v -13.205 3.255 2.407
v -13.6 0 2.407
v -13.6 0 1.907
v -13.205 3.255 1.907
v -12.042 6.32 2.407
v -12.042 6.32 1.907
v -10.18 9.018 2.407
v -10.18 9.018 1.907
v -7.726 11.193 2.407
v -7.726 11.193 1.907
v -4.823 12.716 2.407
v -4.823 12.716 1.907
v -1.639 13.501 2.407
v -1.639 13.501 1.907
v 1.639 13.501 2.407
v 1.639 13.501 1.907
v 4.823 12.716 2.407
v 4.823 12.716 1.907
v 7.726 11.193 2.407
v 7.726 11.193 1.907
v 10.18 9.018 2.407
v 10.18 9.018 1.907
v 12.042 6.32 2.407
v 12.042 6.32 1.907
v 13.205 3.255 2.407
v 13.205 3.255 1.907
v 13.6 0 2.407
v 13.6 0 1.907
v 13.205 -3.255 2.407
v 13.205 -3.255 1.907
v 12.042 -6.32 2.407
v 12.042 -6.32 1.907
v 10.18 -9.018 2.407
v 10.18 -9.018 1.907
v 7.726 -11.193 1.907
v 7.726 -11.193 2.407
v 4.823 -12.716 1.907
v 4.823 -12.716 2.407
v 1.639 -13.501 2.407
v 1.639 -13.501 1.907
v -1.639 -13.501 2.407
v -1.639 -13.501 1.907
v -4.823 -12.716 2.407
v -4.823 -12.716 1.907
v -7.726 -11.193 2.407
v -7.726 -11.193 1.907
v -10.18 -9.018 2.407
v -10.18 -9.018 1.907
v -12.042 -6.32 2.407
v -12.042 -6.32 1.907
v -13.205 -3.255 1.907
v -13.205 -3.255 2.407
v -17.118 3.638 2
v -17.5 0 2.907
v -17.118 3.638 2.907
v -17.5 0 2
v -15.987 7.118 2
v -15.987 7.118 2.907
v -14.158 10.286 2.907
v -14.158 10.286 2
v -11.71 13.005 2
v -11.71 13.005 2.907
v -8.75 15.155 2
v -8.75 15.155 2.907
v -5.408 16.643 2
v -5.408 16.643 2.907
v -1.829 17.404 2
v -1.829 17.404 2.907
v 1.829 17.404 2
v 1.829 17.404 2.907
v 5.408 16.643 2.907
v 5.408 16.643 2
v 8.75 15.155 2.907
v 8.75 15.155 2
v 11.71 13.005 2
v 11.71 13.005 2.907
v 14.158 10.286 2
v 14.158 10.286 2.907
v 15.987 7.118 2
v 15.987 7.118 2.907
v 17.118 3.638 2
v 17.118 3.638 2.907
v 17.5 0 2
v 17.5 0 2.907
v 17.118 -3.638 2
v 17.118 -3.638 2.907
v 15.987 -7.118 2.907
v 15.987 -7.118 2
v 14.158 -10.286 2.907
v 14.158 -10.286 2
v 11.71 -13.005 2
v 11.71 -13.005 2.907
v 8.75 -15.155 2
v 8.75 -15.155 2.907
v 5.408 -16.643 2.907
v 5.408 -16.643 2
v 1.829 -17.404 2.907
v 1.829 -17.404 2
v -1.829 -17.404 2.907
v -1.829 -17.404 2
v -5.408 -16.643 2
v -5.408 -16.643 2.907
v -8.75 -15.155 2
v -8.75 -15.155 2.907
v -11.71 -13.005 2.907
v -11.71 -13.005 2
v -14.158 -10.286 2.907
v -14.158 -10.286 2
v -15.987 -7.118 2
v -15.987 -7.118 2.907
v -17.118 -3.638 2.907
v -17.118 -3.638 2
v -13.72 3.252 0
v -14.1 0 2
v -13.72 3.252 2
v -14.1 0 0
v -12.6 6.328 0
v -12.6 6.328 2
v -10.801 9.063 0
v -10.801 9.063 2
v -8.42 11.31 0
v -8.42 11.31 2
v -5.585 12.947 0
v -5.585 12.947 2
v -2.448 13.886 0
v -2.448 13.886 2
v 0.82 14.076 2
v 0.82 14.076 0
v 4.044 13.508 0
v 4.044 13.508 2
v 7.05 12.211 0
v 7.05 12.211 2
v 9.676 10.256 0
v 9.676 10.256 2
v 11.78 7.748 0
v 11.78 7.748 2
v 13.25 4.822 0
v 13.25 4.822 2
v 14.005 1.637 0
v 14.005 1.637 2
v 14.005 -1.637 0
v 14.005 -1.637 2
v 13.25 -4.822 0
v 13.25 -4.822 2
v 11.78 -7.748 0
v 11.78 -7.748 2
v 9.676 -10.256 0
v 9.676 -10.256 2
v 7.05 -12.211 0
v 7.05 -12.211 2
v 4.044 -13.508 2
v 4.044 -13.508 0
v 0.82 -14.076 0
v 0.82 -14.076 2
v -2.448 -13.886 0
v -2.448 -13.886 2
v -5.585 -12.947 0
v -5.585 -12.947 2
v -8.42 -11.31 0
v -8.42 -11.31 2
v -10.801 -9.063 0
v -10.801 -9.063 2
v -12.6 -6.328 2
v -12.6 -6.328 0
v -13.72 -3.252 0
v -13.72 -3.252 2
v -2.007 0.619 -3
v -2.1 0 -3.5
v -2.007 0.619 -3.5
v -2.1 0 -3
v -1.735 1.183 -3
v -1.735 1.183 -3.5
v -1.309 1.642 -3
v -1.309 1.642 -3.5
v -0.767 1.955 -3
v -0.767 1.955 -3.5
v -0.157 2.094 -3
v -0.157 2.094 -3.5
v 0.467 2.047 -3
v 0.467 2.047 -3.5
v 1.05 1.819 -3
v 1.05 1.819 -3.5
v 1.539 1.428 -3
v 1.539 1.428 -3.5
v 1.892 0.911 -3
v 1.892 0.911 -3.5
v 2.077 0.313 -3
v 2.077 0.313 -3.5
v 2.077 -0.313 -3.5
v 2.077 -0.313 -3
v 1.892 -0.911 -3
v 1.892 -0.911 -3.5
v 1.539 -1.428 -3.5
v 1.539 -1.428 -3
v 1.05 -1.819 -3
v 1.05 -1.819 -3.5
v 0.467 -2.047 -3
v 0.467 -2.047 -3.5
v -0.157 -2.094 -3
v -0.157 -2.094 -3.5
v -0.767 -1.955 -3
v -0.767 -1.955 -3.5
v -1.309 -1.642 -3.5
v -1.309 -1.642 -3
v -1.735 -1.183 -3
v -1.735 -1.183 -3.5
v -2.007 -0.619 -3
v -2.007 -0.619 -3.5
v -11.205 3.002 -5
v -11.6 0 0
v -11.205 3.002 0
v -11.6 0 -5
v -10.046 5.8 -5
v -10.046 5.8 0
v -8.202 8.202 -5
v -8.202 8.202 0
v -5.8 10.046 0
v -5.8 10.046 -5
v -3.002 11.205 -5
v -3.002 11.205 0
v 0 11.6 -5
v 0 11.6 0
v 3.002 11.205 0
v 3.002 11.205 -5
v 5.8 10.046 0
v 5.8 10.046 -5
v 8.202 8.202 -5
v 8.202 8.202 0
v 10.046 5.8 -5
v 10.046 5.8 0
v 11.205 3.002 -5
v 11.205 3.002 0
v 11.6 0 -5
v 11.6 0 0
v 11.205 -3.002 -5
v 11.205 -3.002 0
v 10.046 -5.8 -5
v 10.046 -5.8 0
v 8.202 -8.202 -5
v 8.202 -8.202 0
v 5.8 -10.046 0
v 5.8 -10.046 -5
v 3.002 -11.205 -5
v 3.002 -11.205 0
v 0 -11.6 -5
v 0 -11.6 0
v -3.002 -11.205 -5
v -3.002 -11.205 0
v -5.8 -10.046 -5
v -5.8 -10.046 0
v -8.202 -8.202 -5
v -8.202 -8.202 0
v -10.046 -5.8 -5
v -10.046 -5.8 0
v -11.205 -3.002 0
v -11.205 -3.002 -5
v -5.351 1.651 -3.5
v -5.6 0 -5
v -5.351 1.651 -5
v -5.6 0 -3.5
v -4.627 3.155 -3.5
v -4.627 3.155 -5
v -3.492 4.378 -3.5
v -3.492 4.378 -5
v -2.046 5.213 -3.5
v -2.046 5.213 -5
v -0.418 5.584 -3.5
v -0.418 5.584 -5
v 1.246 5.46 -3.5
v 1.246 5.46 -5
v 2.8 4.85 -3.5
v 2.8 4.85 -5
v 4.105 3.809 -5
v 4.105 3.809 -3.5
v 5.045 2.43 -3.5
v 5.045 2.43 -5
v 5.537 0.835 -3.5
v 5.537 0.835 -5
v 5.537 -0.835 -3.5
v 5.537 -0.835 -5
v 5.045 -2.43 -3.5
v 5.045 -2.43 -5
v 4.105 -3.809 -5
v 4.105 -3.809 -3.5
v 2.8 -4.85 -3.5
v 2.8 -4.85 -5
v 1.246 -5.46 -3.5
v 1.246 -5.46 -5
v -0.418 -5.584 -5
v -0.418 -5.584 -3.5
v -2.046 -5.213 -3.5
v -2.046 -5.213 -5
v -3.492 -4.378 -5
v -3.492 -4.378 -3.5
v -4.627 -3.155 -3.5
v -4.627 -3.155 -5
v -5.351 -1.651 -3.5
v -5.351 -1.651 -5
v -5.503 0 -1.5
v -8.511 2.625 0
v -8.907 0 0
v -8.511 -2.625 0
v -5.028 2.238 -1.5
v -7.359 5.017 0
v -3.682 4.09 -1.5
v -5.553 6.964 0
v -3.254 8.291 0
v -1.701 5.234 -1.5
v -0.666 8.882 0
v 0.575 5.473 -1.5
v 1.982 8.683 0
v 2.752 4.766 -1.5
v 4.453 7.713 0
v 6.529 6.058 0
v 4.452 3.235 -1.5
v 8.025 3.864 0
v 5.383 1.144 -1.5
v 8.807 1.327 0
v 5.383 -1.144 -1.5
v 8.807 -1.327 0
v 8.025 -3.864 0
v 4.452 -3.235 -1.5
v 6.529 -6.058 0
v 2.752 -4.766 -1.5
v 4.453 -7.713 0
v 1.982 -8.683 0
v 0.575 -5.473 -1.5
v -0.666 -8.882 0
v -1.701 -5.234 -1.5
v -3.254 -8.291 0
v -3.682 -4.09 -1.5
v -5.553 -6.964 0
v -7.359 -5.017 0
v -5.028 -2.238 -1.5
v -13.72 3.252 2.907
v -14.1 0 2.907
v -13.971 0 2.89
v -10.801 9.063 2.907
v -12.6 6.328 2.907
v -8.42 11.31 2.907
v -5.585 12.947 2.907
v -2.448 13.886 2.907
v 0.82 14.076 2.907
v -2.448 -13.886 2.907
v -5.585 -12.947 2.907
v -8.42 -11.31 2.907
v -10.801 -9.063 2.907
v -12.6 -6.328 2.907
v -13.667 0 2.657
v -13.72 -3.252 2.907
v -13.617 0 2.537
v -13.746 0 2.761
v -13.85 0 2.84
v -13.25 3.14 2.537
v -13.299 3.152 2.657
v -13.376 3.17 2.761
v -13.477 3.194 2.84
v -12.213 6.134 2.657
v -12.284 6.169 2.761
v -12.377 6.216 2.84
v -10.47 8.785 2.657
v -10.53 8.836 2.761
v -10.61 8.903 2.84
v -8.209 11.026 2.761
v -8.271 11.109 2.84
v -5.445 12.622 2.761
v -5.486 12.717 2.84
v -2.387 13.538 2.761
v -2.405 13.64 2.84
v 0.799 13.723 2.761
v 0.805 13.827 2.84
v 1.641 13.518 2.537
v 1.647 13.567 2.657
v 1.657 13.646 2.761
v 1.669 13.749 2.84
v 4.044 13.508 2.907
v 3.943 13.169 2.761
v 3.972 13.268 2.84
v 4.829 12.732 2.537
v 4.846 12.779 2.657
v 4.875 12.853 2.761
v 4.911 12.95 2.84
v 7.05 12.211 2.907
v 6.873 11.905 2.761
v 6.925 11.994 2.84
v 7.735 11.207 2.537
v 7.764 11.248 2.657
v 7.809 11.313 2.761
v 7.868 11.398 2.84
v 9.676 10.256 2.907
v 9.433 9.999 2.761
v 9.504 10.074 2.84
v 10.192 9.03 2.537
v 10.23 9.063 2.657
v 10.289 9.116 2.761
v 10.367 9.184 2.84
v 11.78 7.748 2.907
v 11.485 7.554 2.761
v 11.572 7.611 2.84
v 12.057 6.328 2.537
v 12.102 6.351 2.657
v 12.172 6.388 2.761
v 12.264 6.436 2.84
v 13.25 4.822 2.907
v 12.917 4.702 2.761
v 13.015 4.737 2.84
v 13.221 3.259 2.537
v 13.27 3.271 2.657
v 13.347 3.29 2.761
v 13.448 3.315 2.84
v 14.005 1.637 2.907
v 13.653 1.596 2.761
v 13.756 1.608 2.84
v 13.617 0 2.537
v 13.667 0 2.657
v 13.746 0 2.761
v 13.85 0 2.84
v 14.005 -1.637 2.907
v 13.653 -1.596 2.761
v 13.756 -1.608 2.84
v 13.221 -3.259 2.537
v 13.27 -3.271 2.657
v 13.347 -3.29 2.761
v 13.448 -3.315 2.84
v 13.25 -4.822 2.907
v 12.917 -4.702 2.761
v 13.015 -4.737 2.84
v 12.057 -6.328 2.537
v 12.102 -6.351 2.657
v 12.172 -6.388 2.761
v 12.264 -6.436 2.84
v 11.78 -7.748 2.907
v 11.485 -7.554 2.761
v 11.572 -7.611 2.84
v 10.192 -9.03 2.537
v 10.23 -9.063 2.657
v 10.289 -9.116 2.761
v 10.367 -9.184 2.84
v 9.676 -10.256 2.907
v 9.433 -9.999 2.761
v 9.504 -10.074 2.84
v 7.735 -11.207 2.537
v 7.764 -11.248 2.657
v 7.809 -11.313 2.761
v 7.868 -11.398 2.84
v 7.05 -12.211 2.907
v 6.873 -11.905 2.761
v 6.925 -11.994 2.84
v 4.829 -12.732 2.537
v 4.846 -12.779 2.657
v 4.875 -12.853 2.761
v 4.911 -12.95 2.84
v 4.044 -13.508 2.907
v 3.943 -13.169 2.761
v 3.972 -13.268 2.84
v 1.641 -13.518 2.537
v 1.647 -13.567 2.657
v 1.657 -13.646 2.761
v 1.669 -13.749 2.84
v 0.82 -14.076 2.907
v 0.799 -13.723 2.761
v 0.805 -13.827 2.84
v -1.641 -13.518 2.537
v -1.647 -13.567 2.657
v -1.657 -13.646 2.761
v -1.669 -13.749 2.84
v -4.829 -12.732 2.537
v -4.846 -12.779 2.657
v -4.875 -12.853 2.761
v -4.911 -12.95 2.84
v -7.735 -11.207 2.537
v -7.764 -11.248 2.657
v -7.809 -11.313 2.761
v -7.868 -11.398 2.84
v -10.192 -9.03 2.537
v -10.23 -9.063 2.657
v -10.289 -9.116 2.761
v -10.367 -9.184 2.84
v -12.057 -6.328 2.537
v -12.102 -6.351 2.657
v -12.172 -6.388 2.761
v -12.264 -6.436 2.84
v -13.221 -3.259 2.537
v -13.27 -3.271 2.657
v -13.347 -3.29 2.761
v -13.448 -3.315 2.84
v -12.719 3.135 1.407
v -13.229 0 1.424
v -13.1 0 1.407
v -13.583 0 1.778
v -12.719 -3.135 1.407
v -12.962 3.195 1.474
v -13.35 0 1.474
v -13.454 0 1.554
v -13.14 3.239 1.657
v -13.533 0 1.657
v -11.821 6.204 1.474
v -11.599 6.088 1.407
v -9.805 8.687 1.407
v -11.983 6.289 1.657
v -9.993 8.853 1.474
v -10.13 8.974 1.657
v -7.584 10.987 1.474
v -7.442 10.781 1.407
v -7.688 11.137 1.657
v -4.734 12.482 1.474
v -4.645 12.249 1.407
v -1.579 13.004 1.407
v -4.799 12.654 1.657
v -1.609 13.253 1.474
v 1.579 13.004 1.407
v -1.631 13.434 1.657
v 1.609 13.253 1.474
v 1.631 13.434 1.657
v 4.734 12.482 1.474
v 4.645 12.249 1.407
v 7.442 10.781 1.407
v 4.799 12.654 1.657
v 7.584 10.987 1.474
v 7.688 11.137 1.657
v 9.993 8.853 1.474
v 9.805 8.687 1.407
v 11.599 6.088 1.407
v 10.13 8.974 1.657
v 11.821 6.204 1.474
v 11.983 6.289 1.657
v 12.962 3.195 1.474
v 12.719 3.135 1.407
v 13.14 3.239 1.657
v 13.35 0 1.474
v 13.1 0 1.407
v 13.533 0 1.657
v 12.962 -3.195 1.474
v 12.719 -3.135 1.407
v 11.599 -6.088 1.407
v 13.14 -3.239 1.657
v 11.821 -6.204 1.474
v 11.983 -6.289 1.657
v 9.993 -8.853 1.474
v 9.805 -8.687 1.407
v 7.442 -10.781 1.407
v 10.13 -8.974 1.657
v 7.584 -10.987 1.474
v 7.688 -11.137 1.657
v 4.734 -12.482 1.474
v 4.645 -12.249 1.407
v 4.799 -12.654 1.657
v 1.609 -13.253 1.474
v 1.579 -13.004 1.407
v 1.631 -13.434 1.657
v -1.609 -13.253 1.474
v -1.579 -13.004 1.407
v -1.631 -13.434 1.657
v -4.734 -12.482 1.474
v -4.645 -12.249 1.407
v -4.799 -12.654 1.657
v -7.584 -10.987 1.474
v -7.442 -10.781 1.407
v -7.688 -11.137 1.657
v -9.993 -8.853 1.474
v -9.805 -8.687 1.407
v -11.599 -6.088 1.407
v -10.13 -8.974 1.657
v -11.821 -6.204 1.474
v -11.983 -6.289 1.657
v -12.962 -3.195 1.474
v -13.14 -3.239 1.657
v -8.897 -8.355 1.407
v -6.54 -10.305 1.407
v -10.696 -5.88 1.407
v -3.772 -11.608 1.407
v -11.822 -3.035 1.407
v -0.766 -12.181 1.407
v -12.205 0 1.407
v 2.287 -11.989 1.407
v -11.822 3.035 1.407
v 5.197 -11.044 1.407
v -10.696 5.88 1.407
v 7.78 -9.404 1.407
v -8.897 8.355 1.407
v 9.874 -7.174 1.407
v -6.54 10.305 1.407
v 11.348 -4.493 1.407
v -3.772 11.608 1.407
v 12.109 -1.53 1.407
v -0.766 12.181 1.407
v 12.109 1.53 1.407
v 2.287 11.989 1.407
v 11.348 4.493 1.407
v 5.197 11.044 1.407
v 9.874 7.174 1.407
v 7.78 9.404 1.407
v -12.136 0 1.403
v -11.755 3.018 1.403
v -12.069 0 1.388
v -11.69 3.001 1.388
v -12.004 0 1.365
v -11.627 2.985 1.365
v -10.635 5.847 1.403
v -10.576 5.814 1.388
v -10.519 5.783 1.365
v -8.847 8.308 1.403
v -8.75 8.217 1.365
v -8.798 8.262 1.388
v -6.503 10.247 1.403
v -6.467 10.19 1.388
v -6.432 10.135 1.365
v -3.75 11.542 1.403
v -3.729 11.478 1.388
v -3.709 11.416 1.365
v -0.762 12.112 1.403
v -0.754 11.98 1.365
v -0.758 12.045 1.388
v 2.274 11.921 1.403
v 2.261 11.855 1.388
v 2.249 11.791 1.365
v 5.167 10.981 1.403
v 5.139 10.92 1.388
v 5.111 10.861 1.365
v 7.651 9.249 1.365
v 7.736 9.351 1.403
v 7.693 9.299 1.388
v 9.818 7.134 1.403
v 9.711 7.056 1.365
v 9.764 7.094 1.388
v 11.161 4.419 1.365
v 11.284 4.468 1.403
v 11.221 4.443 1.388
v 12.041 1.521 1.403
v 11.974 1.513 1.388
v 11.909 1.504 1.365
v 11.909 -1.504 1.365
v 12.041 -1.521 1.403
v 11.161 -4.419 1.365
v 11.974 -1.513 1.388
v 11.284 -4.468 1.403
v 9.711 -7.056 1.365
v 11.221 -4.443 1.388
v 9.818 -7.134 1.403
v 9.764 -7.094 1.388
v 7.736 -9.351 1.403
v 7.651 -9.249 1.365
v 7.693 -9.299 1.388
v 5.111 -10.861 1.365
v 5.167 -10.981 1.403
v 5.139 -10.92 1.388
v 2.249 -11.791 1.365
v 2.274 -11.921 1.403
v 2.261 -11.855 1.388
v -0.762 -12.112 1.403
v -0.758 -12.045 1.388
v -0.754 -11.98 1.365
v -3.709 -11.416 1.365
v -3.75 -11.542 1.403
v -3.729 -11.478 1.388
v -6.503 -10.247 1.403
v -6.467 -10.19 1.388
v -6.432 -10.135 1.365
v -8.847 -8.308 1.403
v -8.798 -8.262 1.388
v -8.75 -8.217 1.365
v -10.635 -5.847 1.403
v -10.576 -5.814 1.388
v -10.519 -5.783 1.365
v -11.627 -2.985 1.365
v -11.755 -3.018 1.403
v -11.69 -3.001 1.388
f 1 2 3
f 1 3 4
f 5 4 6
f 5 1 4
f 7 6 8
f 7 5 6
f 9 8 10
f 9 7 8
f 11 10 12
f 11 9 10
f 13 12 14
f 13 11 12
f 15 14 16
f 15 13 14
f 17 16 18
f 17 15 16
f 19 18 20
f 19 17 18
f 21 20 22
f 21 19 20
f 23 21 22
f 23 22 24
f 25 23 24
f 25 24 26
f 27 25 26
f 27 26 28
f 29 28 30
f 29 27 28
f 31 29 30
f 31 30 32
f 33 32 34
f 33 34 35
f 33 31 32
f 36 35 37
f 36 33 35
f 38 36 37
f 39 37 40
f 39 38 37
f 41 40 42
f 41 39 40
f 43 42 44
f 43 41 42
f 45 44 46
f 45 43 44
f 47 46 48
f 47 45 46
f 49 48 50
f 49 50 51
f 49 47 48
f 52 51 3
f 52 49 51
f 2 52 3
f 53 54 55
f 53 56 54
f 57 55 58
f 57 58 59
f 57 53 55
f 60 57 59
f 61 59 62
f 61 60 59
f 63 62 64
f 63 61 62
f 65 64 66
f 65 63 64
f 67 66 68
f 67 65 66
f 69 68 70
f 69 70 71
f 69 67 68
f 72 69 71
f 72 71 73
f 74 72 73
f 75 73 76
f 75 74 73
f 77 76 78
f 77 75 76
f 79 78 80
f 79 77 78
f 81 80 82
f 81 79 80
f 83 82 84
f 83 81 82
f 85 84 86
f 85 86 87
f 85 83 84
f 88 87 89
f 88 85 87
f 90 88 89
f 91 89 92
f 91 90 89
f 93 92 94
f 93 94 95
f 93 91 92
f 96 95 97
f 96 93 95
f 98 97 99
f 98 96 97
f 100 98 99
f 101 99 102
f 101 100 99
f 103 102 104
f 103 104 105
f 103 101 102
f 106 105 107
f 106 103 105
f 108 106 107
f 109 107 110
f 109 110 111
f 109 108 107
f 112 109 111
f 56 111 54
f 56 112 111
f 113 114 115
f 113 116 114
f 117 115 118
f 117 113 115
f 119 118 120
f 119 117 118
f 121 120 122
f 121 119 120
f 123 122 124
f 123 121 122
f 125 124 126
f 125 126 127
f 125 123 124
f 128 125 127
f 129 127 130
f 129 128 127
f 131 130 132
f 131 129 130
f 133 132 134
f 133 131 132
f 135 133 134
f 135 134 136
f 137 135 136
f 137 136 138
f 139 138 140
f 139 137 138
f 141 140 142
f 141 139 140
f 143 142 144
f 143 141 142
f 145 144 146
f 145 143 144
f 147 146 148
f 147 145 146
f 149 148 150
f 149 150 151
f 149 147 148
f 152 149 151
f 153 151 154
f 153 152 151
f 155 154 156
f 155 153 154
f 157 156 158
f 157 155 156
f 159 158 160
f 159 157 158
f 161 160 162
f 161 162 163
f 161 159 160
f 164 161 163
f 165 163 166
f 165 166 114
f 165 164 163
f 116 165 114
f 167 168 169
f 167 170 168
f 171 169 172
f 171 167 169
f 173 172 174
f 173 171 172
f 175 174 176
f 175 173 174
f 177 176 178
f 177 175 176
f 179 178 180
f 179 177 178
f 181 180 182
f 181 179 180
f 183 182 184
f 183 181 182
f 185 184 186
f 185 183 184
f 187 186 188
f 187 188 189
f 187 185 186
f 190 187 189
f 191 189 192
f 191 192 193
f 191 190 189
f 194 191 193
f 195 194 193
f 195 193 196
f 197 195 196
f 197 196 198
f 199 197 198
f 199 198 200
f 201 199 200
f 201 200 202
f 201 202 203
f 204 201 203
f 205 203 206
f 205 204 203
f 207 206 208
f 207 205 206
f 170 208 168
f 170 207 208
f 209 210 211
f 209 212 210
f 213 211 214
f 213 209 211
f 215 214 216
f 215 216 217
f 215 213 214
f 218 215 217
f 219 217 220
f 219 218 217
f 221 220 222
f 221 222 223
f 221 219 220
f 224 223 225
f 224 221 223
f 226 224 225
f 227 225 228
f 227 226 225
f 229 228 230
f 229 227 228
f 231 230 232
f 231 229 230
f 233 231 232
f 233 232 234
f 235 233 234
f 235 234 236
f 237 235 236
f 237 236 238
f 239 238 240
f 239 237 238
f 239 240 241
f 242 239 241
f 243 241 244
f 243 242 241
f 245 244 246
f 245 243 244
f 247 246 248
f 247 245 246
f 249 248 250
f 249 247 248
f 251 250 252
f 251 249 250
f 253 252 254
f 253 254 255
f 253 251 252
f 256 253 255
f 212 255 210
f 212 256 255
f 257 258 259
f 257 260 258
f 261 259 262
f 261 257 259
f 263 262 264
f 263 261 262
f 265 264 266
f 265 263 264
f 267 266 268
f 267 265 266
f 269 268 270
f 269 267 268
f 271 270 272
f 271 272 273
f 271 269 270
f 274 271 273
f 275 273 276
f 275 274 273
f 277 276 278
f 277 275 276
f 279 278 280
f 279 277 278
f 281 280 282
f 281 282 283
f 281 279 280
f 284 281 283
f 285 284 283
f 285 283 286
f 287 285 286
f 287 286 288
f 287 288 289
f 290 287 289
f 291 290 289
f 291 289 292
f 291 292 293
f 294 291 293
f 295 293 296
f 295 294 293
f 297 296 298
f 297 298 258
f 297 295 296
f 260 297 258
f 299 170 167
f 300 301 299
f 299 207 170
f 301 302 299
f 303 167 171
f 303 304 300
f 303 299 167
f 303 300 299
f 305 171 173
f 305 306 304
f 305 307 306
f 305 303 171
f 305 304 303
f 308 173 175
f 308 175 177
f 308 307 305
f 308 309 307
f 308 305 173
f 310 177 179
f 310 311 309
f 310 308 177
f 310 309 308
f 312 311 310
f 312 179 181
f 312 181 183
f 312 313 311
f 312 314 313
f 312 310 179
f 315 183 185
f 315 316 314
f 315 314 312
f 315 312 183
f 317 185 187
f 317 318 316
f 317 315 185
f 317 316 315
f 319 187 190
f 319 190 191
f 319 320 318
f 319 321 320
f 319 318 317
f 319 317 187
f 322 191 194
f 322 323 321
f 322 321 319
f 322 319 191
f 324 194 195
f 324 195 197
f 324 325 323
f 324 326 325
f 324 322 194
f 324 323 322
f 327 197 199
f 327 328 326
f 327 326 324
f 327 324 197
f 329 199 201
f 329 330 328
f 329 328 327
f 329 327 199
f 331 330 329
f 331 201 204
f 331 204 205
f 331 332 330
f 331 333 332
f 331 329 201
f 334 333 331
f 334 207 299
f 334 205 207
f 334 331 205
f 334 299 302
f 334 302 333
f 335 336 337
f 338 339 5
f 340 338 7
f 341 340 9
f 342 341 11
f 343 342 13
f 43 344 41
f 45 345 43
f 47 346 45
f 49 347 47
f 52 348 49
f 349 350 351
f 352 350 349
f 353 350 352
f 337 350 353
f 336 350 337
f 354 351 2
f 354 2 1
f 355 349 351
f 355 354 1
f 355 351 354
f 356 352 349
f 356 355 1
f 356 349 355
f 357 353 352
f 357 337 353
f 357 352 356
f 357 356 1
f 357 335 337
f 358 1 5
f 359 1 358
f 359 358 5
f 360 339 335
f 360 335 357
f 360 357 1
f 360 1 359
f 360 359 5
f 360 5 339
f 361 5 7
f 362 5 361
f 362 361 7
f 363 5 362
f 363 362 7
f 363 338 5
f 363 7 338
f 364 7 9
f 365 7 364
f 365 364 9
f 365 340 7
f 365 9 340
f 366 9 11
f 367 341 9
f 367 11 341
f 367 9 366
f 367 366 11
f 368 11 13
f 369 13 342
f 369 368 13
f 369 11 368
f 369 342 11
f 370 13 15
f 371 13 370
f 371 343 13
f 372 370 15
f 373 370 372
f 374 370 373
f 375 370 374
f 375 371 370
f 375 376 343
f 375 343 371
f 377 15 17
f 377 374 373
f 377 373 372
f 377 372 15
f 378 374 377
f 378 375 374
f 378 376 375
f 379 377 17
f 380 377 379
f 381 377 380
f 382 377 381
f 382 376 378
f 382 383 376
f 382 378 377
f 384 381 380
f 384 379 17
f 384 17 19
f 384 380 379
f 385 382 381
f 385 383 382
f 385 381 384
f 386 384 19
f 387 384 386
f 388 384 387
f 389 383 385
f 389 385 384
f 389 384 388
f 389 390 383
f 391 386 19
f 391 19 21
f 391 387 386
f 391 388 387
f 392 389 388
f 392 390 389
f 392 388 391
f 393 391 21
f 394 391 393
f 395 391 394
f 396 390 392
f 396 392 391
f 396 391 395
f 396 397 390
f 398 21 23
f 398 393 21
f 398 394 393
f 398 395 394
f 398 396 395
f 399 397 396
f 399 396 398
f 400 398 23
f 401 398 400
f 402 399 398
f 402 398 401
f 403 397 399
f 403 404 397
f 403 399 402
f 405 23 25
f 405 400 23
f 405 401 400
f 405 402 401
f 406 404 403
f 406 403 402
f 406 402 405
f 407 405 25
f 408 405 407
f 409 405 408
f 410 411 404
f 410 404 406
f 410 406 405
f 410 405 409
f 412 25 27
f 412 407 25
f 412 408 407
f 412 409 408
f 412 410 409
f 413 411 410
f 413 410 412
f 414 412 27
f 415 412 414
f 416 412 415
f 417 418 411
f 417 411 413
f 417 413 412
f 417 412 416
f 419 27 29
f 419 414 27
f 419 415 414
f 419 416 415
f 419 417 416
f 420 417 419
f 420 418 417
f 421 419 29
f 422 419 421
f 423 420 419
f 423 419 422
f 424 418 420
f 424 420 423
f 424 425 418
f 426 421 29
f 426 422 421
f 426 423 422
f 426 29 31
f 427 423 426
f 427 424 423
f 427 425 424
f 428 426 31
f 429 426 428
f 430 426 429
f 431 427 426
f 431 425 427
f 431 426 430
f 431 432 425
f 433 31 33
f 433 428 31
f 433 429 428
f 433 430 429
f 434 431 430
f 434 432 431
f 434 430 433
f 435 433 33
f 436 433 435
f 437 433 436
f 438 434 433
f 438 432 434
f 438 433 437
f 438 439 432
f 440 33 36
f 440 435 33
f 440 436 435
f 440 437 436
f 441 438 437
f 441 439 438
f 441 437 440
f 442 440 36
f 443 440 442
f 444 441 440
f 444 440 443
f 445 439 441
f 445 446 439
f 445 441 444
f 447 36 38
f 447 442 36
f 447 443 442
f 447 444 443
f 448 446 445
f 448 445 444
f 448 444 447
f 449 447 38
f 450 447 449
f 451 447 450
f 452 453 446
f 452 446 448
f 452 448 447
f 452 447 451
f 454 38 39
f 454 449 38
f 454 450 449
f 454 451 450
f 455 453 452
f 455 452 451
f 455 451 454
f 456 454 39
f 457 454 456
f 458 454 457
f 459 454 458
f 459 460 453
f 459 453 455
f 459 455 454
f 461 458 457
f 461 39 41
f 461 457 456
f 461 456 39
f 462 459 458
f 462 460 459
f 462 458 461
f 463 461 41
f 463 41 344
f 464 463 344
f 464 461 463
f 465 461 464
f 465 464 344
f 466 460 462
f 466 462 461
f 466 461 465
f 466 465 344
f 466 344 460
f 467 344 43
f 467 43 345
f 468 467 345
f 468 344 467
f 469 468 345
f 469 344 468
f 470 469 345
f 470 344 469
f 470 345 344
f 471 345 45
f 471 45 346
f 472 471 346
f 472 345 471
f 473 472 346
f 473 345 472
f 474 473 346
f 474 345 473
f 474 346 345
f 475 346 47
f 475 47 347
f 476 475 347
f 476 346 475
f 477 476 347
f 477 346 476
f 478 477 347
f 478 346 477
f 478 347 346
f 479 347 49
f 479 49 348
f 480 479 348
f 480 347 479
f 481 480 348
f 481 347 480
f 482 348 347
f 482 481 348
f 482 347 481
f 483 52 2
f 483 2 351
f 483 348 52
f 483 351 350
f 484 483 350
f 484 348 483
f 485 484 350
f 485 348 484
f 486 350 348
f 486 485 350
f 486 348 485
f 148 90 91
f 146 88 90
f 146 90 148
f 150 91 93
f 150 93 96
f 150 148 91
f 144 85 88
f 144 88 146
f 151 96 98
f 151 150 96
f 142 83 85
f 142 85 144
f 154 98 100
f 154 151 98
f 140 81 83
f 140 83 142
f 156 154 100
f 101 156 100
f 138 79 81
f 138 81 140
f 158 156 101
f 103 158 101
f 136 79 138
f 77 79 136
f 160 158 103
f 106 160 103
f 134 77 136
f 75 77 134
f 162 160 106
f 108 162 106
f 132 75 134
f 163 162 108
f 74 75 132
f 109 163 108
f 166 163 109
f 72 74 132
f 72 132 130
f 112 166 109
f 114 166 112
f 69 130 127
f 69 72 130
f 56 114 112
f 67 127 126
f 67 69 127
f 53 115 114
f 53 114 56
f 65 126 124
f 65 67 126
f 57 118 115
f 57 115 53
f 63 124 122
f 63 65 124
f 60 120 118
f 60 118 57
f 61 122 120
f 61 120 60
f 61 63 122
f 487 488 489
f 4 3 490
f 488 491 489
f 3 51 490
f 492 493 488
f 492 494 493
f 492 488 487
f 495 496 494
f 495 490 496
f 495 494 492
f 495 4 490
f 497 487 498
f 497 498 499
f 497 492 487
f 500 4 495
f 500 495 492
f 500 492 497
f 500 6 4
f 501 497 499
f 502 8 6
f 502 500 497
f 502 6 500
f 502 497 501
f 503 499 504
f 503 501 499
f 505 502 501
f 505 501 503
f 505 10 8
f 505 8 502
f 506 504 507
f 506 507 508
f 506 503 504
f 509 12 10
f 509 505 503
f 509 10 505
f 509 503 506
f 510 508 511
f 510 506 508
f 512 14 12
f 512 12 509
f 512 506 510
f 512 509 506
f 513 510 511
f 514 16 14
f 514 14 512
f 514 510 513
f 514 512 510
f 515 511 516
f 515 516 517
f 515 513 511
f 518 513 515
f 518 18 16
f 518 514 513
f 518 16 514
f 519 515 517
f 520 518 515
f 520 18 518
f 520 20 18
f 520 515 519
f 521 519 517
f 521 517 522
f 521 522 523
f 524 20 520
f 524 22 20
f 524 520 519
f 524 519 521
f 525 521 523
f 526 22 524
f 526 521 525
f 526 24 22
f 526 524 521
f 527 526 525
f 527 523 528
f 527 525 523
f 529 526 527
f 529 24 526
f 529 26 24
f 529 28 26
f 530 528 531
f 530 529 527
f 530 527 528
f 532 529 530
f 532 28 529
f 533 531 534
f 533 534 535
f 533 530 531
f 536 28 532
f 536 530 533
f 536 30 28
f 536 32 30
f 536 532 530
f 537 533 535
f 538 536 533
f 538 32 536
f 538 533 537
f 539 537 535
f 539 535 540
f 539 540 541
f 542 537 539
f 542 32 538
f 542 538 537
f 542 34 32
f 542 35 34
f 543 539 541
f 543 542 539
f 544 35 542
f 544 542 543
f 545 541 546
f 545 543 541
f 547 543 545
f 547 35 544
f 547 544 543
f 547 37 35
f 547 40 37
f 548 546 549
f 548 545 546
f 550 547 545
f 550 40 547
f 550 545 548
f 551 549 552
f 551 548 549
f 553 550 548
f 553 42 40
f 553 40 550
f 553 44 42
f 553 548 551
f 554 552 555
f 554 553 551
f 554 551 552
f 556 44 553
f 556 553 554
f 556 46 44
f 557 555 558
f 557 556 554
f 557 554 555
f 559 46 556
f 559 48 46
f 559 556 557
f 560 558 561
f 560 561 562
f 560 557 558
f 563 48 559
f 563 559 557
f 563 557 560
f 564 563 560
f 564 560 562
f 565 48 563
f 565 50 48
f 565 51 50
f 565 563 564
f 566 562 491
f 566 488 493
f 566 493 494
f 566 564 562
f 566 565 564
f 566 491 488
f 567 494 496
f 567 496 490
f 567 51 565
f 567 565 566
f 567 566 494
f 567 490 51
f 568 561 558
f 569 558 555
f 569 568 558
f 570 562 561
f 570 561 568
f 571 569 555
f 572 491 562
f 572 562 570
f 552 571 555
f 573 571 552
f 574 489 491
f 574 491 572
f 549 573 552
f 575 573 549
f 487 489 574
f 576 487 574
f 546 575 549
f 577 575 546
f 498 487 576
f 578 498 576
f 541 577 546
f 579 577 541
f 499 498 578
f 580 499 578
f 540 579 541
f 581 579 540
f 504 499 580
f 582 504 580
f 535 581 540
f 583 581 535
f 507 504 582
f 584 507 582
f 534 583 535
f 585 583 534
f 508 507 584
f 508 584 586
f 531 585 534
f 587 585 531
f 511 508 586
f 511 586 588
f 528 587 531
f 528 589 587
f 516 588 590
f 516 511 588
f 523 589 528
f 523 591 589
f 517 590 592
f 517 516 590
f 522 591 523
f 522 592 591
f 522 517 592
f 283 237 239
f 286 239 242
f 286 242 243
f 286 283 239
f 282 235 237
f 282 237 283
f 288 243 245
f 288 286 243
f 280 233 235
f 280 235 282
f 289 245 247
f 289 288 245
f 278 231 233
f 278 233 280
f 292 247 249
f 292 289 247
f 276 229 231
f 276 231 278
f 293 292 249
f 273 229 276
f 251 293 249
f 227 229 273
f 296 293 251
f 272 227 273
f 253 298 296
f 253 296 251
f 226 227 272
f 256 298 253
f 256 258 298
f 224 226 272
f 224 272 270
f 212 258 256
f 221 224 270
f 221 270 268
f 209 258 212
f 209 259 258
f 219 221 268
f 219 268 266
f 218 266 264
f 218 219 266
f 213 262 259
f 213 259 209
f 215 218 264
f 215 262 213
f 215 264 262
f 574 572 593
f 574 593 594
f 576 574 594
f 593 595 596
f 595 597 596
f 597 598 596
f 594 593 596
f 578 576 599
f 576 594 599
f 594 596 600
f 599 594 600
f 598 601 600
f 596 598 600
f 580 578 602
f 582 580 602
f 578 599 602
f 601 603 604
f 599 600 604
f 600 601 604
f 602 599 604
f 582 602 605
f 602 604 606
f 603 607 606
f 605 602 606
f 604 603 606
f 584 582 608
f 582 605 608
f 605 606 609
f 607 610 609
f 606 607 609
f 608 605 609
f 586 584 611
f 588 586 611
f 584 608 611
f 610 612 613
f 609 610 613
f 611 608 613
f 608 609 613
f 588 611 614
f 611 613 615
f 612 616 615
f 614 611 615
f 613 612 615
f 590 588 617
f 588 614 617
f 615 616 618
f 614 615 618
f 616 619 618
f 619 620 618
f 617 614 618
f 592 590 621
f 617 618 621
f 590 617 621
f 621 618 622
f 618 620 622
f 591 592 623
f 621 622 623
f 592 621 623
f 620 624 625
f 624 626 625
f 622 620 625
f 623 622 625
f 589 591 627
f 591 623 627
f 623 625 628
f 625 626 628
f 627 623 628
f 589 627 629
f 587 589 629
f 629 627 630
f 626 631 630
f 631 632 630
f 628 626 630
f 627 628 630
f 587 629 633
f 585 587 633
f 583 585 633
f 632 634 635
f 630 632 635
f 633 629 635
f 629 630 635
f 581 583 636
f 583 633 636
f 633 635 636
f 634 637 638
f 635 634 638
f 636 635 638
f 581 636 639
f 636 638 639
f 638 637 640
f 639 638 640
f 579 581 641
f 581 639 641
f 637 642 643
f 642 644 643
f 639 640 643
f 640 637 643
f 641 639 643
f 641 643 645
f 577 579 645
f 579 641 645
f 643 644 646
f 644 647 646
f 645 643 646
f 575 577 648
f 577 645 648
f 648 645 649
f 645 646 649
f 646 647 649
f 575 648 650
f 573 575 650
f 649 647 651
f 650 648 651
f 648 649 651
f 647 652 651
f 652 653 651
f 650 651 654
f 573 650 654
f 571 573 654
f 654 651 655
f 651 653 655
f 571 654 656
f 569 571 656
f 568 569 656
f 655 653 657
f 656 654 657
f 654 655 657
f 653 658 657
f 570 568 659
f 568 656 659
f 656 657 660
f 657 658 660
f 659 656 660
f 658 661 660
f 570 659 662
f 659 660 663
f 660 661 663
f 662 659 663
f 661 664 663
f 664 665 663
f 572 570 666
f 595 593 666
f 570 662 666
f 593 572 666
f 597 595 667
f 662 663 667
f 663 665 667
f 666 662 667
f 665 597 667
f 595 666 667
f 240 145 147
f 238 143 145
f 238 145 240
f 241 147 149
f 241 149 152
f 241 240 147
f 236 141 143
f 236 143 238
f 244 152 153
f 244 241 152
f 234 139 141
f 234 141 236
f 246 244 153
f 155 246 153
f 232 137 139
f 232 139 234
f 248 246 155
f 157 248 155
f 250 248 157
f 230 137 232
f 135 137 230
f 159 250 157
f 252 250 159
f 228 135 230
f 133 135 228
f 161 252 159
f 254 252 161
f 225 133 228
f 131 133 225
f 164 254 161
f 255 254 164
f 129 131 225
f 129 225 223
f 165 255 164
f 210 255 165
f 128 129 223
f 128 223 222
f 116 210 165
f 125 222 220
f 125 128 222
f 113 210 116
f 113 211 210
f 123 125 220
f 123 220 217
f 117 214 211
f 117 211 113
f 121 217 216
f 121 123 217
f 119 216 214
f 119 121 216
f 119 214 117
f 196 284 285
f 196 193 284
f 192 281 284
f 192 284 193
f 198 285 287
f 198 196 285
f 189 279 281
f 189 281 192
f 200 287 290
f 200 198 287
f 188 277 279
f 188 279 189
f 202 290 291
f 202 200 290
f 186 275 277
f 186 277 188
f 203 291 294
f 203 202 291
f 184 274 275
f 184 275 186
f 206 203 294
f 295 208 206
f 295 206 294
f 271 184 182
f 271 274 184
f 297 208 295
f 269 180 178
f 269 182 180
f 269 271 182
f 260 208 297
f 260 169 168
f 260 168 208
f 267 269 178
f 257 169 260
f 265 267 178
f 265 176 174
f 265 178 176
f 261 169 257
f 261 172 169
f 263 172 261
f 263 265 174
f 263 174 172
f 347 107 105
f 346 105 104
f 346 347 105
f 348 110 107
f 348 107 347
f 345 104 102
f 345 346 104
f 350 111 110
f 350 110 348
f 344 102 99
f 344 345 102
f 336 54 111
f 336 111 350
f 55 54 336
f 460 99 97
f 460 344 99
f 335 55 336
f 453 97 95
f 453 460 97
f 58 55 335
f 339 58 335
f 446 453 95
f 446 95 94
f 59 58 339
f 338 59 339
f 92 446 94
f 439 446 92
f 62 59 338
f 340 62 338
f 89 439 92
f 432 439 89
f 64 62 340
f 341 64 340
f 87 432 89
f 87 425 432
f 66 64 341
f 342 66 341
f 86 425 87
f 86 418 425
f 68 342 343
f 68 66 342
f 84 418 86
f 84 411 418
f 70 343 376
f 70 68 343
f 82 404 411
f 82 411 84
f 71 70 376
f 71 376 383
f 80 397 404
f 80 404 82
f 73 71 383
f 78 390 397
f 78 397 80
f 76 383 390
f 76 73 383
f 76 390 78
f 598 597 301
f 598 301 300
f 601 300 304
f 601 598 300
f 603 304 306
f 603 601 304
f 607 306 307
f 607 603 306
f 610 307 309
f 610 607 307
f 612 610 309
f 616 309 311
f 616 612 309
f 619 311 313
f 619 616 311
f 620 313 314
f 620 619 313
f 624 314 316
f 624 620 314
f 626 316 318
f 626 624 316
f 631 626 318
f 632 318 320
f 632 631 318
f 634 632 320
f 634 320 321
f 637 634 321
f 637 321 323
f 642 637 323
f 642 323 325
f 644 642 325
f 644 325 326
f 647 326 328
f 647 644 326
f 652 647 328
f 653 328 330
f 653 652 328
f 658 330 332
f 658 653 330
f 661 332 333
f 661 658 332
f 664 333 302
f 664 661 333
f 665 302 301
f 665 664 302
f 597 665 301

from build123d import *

# Parameters (mm, degrees)
F4_R = 0.5
F5_R = 0.5
F6_R = 0.5


# Not quite as in the source:
# - a feature of the source that left no trace in its solid (it failed there, or was rolled back) is left out


with BuildPart() as f1:
    # F0 (on Front) → F1 (revolve)
    with BuildSketch(Plane.XZ):
        Polygon((-2.1, -3), (-8.9066560708, 0), (-11.6, 0), (-11.6, -5), (-5.6, -5), (-5.6, -3.5), (-2.1, -3.5), align=None)
        Polygon((-11.6, 0), (-8.9066560708, 0), (-12.1, 1.4074505437), (-13.6, 1.4074505437), (-13.6, 2.9074505437), (-17.5, 2.9074505437), (-17.5, 2), (-14.1, 2), (-14.1, 0), align=None)
    revolve(axis=Axis((0, 0, -7.5), (0, 0, -1)))

    # F4
    f4_edges = [f1.edges().sort_by_distance(p)[0] for p in [
        (13.6, 0, 1.407451),
    ]]
    fillet(f4_edges, radius=F4_R)

    # F5
    f5_edges = [f1.edges().sort_by_distance(p)[0] for p in [
        (12.1, 0, 1.407451),
    ]]
    fillet(f5_edges, radius=F5_R)

    # F6
    f6_edges = [f1.edges().sort_by_distance(p)[0] for p in [
        (13.6, 0, 2.907451),
    ]]
    fillet(f6_edges, radius=F6_R)


solid = f1.part
